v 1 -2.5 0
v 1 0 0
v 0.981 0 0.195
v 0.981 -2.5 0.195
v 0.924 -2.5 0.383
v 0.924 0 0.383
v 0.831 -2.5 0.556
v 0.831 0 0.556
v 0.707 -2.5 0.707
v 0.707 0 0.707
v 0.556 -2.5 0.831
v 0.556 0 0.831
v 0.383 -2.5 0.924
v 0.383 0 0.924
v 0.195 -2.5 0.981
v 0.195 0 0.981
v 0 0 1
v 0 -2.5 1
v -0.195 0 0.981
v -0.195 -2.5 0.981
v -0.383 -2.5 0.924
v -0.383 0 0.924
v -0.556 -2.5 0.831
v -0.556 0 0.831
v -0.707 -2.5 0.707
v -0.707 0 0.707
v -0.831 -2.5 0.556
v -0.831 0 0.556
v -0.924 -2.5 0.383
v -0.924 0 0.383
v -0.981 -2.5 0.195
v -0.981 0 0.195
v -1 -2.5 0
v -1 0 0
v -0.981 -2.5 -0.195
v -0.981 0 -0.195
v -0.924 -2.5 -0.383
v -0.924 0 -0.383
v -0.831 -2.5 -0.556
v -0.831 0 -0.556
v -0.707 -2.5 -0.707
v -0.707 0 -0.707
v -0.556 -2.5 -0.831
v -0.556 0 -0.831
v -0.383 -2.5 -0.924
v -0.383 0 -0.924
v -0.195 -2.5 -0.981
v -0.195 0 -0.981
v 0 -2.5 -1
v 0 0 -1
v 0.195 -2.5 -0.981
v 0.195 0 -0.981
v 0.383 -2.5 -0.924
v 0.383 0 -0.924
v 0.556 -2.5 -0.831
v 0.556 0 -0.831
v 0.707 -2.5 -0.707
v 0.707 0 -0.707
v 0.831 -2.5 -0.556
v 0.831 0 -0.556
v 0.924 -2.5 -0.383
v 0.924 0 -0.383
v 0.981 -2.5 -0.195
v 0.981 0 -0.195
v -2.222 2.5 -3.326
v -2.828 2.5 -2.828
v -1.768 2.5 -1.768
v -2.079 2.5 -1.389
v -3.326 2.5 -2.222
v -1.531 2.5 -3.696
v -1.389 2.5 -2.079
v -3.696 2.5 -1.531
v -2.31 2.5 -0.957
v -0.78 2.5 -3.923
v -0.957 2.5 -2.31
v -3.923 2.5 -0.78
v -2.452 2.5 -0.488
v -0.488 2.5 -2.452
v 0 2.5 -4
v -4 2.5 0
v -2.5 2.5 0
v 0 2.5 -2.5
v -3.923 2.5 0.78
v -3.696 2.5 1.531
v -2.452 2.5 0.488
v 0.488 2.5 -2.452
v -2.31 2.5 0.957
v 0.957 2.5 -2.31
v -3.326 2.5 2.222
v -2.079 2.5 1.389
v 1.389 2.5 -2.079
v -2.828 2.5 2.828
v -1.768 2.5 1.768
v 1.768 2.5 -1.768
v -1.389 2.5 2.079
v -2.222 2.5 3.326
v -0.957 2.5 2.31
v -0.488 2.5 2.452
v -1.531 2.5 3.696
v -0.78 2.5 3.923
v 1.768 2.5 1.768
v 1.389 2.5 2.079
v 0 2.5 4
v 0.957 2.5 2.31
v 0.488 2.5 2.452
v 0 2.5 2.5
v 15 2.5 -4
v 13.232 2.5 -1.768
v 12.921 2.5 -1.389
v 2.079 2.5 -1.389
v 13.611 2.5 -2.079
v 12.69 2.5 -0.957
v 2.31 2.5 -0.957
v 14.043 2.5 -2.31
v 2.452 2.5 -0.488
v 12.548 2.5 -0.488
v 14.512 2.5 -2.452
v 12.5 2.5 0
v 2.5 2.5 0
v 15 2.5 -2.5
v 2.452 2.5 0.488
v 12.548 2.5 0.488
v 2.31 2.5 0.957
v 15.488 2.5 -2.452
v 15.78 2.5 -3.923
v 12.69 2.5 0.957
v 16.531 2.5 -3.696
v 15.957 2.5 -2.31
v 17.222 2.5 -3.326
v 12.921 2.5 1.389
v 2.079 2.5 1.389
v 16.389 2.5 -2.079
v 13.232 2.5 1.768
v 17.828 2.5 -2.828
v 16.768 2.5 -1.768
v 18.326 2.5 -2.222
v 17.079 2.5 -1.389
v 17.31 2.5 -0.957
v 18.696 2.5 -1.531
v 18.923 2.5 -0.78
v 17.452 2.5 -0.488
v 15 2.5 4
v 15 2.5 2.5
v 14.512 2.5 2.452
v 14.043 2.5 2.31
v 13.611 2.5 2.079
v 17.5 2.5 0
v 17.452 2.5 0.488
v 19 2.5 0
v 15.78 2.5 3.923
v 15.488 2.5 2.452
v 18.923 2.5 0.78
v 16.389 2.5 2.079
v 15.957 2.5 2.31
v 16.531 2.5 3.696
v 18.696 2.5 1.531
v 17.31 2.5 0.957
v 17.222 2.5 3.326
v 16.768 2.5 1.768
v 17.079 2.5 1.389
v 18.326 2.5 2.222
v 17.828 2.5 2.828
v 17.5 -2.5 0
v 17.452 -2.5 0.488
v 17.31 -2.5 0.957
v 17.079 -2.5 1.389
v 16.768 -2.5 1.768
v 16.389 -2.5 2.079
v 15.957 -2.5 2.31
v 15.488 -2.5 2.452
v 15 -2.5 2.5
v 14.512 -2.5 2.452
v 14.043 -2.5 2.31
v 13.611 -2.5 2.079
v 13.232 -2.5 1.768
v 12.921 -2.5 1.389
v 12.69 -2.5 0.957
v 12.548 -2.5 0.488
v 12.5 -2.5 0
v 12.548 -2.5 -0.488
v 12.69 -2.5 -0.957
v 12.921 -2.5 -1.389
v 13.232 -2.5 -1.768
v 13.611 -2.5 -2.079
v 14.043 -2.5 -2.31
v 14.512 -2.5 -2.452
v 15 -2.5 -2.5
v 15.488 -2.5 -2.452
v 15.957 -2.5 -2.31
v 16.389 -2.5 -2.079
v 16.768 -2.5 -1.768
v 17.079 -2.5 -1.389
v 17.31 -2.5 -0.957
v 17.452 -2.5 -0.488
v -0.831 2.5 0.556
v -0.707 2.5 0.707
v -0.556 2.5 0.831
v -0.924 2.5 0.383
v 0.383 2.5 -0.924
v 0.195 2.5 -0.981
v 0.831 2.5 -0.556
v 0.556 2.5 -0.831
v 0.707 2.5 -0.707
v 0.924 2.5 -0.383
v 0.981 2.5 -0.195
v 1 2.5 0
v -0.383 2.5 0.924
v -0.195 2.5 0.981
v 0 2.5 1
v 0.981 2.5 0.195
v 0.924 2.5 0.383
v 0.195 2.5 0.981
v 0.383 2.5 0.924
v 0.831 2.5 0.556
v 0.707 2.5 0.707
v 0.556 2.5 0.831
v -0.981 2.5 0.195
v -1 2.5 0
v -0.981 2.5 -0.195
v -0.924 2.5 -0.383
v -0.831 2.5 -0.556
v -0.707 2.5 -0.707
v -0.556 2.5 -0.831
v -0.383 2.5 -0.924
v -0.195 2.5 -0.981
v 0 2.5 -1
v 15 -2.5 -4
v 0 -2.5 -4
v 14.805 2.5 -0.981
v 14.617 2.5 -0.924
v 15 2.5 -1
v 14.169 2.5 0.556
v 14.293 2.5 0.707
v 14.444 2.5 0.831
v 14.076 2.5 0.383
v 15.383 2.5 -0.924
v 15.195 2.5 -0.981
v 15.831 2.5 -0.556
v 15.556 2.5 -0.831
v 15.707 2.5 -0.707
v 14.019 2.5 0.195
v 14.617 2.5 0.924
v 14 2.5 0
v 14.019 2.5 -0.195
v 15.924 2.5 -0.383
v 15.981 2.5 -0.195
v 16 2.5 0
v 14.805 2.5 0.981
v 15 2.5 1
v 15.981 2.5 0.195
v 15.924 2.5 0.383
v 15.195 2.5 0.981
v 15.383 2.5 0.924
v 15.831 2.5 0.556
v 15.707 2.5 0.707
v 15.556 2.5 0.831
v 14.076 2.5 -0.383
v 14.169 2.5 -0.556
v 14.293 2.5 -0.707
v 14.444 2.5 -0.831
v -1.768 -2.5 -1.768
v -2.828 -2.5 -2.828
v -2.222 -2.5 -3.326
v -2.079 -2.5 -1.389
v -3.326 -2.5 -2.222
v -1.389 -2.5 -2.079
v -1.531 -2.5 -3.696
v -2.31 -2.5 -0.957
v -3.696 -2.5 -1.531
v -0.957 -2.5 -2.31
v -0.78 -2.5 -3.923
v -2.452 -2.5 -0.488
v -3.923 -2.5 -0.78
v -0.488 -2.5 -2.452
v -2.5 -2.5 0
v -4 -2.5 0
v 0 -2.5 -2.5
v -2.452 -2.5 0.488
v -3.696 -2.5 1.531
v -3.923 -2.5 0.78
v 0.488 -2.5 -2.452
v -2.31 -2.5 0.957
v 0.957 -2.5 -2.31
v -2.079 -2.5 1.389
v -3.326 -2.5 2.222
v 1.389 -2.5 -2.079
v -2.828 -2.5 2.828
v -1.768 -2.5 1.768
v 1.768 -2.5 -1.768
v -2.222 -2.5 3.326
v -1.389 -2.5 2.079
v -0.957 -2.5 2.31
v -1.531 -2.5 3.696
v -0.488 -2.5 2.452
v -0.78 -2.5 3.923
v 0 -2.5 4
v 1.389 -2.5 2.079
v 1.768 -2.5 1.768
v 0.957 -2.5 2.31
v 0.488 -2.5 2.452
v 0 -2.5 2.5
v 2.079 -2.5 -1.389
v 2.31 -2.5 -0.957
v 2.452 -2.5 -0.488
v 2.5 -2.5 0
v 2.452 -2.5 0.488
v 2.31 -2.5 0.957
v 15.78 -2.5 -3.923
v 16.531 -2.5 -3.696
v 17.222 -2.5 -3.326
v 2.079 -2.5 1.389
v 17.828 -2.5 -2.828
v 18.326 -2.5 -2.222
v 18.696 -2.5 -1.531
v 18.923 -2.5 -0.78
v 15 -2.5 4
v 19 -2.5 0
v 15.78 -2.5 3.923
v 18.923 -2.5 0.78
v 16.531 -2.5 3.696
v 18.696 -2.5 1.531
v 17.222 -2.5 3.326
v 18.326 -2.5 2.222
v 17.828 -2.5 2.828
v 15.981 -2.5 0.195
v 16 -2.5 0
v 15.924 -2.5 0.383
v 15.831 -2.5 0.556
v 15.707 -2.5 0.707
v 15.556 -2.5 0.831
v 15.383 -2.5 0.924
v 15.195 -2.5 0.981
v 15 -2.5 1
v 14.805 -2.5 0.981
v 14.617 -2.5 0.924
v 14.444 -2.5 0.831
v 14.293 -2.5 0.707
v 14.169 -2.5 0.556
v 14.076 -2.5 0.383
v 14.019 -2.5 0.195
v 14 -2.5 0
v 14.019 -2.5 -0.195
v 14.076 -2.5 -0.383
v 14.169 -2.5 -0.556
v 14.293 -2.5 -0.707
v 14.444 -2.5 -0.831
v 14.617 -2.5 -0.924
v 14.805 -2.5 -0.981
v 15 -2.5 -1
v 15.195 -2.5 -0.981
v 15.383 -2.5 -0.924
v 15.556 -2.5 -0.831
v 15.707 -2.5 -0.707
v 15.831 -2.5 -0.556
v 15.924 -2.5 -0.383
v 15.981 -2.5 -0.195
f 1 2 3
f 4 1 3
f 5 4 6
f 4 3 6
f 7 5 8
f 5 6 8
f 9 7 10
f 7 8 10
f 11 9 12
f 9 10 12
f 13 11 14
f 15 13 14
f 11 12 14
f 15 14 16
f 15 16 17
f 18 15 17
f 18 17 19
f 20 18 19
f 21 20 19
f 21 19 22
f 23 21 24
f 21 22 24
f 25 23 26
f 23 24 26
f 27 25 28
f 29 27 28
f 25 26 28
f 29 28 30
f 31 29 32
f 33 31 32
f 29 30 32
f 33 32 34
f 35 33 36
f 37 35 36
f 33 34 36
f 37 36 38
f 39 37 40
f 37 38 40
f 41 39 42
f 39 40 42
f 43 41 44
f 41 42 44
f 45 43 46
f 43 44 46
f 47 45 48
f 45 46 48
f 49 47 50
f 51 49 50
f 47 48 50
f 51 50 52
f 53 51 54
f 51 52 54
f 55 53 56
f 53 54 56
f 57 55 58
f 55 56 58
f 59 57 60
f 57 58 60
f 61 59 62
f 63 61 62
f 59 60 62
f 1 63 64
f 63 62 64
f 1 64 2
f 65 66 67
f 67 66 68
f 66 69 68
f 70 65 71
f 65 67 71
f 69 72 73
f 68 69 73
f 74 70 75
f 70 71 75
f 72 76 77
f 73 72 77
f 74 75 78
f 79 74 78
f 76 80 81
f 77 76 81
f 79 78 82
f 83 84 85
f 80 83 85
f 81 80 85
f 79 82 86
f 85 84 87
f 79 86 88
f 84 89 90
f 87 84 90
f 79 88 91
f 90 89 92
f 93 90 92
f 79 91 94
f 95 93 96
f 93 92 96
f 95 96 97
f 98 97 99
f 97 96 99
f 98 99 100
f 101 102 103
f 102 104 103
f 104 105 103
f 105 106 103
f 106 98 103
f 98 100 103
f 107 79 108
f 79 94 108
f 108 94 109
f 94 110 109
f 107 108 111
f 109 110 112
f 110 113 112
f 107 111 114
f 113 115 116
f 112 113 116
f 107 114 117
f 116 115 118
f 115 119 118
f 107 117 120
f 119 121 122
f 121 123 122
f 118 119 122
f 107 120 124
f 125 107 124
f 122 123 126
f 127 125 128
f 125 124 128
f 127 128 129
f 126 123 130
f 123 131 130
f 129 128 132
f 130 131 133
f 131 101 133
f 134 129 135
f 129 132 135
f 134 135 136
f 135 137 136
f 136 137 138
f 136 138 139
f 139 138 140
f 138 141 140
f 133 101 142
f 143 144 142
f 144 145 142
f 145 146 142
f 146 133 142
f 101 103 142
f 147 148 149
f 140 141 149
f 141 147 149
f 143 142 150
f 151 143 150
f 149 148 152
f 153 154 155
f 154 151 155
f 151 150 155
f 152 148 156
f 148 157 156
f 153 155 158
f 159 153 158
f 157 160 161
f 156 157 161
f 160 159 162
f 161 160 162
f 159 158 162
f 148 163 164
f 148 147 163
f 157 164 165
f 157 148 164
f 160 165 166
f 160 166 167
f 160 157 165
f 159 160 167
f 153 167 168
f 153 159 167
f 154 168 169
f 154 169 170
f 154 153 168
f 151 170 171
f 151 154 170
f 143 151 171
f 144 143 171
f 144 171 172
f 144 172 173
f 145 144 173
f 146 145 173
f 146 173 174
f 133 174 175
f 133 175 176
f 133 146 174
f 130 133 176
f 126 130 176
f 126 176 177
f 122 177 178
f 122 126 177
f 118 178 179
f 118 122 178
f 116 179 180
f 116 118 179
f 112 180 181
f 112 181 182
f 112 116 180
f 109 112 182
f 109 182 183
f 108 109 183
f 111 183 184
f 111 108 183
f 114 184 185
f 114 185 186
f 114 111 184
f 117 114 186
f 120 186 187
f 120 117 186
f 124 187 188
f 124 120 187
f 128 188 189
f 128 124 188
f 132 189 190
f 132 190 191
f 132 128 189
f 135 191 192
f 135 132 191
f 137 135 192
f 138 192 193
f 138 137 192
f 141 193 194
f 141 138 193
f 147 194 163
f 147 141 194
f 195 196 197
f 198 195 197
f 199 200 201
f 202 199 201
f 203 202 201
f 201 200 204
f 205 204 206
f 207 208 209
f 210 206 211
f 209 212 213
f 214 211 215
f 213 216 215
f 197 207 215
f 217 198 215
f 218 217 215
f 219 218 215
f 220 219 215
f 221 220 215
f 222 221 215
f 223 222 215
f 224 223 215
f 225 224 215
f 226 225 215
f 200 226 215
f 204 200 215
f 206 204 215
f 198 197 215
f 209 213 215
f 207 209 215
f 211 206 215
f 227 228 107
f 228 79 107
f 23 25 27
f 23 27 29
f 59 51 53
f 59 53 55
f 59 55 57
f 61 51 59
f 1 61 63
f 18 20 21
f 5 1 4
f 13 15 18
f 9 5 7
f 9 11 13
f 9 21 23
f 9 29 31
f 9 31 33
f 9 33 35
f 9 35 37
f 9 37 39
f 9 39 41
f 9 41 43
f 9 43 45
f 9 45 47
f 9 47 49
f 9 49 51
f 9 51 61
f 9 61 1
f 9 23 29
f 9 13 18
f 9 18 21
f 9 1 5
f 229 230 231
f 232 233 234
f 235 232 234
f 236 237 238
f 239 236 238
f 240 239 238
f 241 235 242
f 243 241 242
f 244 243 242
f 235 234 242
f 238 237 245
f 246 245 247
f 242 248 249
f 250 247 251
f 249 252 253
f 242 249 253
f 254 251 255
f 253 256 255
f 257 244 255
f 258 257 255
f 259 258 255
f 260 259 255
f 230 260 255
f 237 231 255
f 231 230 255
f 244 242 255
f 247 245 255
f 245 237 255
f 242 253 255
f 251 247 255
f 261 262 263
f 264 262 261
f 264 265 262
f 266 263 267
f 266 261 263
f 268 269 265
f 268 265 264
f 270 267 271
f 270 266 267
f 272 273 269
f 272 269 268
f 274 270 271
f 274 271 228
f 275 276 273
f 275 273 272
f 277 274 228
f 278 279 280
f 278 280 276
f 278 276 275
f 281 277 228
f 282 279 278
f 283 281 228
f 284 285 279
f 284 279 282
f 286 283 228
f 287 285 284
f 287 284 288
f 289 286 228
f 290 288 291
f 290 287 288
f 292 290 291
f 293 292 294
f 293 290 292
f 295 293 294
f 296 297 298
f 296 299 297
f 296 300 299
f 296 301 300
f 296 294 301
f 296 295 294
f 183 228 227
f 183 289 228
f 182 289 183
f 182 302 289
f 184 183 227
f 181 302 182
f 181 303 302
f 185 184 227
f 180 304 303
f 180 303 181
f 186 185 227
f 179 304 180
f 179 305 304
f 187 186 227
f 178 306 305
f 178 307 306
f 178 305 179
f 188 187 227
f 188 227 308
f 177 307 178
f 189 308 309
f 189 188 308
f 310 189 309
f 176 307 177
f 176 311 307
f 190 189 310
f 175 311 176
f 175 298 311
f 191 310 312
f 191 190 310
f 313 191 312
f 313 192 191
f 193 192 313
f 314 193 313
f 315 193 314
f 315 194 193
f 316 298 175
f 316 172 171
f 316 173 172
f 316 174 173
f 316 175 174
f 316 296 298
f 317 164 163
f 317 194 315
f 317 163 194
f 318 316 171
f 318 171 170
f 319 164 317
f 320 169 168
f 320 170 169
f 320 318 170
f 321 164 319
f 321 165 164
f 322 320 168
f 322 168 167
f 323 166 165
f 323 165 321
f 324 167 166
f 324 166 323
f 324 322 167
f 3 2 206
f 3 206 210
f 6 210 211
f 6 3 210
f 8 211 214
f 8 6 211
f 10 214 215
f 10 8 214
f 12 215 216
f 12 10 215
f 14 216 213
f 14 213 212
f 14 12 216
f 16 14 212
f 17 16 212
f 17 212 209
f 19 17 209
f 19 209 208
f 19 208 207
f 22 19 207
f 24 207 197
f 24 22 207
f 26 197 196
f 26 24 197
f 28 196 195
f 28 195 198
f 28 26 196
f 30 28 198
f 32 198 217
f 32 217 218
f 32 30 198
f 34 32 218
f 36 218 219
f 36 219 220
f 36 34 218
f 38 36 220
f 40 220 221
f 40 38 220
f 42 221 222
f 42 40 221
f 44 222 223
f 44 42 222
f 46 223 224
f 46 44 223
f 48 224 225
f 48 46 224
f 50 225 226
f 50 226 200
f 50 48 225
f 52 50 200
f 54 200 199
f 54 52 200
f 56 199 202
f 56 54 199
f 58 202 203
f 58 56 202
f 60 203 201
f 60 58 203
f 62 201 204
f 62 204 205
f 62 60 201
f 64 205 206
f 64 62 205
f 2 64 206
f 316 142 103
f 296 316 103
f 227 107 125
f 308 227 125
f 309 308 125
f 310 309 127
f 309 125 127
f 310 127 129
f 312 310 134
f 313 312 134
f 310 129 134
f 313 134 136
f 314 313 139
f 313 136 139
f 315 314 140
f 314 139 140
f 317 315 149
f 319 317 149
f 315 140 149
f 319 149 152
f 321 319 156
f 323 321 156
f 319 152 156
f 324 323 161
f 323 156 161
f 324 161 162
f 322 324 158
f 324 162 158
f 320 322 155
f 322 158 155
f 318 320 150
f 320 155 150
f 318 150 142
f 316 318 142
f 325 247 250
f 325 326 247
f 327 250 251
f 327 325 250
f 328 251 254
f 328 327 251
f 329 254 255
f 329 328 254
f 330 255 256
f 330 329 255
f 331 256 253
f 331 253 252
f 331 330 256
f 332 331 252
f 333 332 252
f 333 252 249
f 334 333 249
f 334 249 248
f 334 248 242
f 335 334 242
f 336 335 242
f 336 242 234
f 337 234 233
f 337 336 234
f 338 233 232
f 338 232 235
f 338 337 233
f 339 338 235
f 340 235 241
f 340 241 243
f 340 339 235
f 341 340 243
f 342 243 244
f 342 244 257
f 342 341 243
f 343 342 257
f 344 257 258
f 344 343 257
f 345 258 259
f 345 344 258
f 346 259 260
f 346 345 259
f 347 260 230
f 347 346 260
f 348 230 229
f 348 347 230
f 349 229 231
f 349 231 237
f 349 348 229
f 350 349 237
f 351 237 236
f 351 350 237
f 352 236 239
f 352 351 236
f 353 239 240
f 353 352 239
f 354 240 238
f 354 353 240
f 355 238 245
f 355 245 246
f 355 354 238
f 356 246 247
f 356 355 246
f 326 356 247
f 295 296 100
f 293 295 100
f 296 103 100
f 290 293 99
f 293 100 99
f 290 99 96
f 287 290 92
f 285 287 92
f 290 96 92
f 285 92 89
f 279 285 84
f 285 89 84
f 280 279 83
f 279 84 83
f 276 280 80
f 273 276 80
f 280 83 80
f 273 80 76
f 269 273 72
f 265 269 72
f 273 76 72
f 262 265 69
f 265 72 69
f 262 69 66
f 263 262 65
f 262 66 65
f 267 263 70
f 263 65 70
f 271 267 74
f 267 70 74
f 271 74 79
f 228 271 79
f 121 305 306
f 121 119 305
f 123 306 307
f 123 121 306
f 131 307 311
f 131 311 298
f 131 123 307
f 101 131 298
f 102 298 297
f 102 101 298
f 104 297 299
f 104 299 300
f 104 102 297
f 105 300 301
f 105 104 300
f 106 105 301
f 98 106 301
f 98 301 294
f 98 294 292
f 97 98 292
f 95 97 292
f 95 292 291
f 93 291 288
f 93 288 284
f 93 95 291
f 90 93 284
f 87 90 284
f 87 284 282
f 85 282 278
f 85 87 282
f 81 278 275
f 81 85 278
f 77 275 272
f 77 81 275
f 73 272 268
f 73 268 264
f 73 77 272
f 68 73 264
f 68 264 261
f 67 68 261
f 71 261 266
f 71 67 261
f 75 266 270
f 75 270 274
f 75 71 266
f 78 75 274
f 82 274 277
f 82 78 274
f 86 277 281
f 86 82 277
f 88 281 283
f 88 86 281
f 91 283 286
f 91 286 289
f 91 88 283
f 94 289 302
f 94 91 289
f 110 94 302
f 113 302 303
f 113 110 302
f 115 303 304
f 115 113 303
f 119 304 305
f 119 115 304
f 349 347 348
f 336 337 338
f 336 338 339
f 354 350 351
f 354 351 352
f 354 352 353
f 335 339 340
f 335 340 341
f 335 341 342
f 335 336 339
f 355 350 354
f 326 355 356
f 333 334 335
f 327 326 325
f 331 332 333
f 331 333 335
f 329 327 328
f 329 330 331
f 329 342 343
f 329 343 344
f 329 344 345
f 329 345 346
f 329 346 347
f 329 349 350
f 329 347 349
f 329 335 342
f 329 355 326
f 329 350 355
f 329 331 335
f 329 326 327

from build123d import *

# Parameters (mm, degrees)
F0_R     = 2.5
F0_R_2   = 1
F1_DEPTH = 2.5


with BuildPart() as f1:
    # F0 (on Front) → F1 (new body, symmetric)
    with BuildSketch(Plane.XZ):
        with BuildLine():
            Line((15, 4), (0, 4))
            ThreePointArc((0, 4), (-4, 0), (0, -4))
            Line((0, -4), (15, -4))
            ThreePointArc((15, -4), (19, 0), (15, 4))
        make_face()
        Circle(F0_R, mode=Mode.SUBTRACT)
        with Locations((15, 0)):
            Circle(F0_R, mode=Mode.SUBTRACT)
        Circle(F0_R_2)
        with Locations((15, 0)):
            Circle(F0_R_2)
    extrude(amount=F1_DEPTH, both=True)


solid = f1.part
